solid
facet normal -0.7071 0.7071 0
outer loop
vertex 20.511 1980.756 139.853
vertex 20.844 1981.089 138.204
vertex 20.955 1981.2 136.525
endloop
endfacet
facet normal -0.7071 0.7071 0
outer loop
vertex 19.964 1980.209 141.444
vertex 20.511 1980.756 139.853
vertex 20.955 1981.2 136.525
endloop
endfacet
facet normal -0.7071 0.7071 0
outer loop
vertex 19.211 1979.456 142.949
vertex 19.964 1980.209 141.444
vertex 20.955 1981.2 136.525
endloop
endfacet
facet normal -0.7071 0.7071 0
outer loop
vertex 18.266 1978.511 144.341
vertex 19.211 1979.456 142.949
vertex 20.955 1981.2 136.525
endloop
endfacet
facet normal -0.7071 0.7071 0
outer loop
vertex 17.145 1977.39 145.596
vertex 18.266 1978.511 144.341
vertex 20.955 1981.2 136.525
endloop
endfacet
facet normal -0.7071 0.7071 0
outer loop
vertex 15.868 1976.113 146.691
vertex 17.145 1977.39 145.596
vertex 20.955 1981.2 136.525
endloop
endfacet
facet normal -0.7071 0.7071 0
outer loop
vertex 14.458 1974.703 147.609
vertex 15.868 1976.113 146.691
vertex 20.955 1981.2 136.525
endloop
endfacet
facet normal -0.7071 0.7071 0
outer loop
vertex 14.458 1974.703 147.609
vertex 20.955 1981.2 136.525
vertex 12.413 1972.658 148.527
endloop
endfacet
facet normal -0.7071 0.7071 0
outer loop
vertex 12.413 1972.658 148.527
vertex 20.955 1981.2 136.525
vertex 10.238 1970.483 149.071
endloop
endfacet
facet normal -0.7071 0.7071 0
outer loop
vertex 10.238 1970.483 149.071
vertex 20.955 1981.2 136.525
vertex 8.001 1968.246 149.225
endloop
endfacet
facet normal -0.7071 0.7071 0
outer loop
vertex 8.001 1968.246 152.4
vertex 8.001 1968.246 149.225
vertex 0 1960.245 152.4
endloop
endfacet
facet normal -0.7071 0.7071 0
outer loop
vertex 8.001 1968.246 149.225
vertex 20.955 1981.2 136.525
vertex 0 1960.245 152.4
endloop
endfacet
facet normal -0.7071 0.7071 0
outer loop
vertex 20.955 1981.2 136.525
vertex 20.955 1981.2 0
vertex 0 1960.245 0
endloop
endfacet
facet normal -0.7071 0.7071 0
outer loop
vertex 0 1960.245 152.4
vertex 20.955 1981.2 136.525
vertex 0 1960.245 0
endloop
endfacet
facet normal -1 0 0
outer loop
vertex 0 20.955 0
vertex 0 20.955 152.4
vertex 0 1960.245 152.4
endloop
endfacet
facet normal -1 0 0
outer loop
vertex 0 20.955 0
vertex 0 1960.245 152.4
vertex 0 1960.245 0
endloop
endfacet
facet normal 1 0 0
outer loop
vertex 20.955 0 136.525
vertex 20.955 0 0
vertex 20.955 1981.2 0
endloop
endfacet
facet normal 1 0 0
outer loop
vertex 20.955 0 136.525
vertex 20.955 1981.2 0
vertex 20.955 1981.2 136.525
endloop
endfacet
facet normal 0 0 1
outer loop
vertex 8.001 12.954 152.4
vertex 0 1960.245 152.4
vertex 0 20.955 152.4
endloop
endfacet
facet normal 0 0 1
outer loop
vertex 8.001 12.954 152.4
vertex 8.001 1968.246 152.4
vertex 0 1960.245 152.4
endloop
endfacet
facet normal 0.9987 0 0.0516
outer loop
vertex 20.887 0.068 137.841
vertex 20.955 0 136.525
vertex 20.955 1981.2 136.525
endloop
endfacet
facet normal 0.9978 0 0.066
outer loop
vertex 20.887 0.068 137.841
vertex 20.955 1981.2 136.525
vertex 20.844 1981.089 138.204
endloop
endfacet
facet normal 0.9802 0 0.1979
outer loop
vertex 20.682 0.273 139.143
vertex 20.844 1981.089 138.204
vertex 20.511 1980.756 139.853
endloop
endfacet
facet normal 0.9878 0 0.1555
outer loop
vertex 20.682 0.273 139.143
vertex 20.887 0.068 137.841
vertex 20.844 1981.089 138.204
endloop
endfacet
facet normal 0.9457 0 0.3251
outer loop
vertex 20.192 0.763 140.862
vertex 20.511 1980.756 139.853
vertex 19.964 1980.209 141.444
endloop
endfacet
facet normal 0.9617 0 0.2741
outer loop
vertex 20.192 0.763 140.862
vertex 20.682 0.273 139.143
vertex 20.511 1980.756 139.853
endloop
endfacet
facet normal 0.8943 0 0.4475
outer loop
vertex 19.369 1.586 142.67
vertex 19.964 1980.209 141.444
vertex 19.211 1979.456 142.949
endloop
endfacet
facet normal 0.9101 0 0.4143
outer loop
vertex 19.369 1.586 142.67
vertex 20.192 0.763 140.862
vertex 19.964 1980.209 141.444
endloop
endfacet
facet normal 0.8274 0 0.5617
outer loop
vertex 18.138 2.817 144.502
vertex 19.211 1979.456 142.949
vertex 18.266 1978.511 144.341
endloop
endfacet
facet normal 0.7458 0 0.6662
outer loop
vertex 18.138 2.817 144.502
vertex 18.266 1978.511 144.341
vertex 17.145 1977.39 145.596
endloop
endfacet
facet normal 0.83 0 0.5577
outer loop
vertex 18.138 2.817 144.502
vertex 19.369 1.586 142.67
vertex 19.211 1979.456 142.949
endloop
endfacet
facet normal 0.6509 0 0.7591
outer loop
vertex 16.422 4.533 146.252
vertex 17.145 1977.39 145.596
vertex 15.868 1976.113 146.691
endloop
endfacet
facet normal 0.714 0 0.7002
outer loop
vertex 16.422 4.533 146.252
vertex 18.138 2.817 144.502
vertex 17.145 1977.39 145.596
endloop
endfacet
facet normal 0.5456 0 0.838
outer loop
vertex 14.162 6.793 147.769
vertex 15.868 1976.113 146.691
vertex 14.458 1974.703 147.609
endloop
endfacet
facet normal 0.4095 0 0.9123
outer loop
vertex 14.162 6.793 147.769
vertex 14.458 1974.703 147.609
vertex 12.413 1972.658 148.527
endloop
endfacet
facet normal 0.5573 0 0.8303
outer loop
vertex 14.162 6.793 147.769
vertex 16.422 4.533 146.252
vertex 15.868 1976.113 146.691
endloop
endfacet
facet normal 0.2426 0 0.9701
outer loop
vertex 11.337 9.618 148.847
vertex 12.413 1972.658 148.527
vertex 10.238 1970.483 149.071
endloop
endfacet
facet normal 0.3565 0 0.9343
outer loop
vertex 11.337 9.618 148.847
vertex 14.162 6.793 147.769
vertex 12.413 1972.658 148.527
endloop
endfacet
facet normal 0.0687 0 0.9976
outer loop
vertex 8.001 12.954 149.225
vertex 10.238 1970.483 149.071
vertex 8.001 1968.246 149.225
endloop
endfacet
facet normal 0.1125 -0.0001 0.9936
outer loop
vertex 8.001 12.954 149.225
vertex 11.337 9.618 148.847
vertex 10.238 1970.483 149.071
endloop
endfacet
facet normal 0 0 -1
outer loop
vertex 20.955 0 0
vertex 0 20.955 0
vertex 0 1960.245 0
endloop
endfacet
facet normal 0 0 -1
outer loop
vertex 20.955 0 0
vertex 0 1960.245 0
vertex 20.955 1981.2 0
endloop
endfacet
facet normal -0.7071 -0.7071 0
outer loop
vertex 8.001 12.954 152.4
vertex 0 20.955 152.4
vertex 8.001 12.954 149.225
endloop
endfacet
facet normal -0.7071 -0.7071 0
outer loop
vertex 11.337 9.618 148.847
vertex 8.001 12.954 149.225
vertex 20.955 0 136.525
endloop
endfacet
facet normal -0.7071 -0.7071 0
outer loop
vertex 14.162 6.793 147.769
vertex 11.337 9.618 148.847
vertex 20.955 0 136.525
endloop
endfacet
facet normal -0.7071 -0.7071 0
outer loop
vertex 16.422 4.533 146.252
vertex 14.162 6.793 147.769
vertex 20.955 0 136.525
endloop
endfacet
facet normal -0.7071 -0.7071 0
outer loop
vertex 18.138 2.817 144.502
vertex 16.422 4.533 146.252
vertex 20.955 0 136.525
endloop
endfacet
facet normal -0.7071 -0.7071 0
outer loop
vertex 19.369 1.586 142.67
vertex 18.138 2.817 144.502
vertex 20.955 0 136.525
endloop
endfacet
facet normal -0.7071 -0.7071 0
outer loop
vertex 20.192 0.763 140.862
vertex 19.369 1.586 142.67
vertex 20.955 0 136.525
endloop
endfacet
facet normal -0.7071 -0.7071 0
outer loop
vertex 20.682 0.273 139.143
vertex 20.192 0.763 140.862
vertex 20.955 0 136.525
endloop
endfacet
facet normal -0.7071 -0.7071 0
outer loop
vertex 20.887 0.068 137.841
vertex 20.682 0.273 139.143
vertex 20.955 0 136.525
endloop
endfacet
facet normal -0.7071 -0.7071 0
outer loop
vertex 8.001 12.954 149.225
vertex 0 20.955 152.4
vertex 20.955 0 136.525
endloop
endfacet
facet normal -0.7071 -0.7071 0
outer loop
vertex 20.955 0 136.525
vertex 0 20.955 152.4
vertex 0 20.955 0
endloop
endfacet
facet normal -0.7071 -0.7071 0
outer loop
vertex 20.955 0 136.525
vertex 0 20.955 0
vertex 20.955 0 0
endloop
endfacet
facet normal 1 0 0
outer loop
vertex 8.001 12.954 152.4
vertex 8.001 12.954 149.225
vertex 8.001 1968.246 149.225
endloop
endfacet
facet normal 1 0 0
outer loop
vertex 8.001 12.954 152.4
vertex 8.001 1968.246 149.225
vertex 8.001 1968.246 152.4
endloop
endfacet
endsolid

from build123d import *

# Parameters (mm, degrees)
F1_DEPTH = 1981.2
F3_DEPTH = 152.4
F5_DEPTH = 152.4


with BuildPart() as f1:
    # F0 (on Front) → F1 (new body)
    with BuildSketch(Plane.XZ):
        with BuildLine():
            Line((0, 152.4), (0, 0))
            Line((0, 0), (20.955, 0))
            Line((20.955, 0), (20.955, 136.525))
            ThreePointArc((20.955, 136.525), (17.14516, 145.595503), (8.001, 149.225))
            Line((8.001, 149.225), (8.001, 152.4))
            Line((8.001, 152.4), (0, 152.4))
        make_face()
    extrude(amount=-F1_DEPTH)

    # F2 (on face) → F3 (cut)
    with BuildSketch(Plane(origin=(0, 0, 0), x_dir=(1, 0, 0), z_dir=(0, 0, -1))):
        Polygon((0, -20.955), (20.955, 0), (0, 0), align=None)
    extrude(amount=-F3_DEPTH, mode=Mode.SUBTRACT)

    # F4 (on face) → F5 (cut)
    with BuildSketch(Plane(origin=(0, 0, 0), x_dir=(1, 0, 0), z_dir=(0, 0, -1))):
        Polygon((0, -1981.2), (20.955, -1981.2), (0, -1960.245), align=None)
    extrude(amount=-F5_DEPTH, mode=Mode.SUBTRACT)


solid = f1.part
